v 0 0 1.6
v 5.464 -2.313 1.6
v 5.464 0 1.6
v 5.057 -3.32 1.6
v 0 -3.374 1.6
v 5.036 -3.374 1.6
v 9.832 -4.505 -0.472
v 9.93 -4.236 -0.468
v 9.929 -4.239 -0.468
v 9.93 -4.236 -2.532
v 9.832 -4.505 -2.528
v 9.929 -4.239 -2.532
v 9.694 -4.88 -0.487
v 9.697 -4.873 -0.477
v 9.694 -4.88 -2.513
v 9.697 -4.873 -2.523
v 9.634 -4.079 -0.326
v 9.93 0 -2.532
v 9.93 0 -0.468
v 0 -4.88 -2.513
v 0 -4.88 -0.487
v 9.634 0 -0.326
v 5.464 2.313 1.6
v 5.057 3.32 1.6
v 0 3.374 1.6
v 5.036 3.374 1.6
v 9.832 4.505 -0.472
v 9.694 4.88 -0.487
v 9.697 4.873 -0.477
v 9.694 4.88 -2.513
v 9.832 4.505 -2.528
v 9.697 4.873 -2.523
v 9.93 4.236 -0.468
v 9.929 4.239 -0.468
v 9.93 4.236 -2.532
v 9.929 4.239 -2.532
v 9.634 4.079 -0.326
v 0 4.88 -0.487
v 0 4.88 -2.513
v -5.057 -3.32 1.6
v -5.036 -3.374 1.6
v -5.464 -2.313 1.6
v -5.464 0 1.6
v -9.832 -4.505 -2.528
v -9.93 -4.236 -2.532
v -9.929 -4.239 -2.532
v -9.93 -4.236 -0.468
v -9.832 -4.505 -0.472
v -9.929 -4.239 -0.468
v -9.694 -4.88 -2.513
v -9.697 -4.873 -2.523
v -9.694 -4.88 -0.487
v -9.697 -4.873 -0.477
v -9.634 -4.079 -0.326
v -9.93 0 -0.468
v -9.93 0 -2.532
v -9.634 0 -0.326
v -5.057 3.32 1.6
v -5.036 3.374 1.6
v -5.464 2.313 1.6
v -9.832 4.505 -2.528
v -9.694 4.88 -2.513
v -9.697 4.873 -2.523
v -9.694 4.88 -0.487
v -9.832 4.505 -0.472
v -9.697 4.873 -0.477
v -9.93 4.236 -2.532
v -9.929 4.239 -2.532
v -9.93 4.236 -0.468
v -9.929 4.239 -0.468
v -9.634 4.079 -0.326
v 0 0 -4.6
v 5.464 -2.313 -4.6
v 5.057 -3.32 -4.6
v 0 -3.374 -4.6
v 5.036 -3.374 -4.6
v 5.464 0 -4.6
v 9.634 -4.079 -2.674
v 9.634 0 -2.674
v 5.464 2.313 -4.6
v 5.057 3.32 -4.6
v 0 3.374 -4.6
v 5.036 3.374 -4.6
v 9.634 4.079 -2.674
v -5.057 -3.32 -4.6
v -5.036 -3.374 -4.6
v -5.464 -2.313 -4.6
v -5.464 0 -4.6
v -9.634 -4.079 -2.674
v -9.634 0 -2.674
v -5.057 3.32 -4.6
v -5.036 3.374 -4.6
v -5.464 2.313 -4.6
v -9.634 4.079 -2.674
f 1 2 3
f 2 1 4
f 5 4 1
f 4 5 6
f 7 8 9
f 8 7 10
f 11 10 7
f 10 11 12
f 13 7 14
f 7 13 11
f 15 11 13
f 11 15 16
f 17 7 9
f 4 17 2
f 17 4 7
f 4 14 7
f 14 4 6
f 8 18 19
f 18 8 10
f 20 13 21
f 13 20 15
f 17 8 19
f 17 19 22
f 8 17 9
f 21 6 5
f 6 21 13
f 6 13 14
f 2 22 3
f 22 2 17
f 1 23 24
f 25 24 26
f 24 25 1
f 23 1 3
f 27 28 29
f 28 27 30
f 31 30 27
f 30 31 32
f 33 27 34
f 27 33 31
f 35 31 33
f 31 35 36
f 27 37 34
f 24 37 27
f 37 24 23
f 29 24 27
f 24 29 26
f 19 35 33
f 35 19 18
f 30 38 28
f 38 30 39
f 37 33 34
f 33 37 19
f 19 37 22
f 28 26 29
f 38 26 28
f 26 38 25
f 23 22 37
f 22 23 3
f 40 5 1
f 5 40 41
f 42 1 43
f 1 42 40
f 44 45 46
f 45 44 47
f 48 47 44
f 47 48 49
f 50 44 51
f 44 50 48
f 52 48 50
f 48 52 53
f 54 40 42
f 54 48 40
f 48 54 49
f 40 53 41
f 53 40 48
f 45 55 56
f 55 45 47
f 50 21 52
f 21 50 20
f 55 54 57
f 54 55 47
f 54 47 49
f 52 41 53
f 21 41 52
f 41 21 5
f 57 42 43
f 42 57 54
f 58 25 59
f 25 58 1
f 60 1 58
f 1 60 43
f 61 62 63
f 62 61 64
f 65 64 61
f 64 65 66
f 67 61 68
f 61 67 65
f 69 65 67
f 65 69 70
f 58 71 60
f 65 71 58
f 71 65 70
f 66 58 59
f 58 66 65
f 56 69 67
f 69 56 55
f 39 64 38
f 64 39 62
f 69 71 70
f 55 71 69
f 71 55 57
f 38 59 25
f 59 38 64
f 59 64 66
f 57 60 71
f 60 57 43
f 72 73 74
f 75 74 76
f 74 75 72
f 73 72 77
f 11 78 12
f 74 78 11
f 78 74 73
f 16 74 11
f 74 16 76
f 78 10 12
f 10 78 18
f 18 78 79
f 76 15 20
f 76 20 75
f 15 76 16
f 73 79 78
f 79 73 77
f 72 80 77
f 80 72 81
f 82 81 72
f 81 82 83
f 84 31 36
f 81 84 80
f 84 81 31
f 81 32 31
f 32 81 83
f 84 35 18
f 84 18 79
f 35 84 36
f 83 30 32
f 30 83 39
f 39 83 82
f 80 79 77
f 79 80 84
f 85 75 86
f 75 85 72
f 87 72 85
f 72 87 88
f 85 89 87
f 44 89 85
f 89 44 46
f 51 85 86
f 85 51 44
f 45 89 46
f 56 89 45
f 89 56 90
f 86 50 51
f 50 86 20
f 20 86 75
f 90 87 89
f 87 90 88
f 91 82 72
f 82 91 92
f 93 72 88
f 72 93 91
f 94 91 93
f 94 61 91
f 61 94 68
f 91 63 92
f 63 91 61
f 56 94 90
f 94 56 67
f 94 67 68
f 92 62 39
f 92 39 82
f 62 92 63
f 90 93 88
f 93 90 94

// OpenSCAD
/*
CubePoints = [
  [  1,  0,  0 ],
  [ 0,  1,  0 ],
  [ 0,  8,  0 ],
  [  1,  9,  0 ],
  [  20,  9,  0 ],
  [  21,  8,  0 ],
  [  21,  1,  0 ],
  [  20,  0,  0 ],
  [  1,  0,  0 ],
 ];
 
for(point = CubePoints) {
  #translate(point)cylinder(d = 0.1, h = 1, $fn = 36);
}

CubeFaces = [
  [0,1,2,3],  // bottom
  [4,5,1,0],  // front
  [7,6,5,4],  // top
  [5,6,2,1],  // right
  [6,7,3,2],  // back
  [7,4,0,3],

  [7,4,0,3],
]; // left
  
polyhedron( CubePoints, CubeFaces );
*/
/*
difference() {
    cube([20, 10, 2], true);
    translate([10, 5, 0]) rotate([0, 0, 45]) cube([3, 3, 3], true);
    translate([10, -5, 0]) rotate([0, 0, -45]) cube([3, 3, 3], true);
    translate([-10, 5, 0]) rotate([0, 0, 45]) cube([3, 3, 3], true);
    translate([-10, -5, 0]) rotate([0, 0, -45]) cube([3, 3, 3], true);
}

translate([7.567, 2.567, 0.82]) rotate([0, -45, 45]) cube([3, 3, 2.5], true);
translate([7.567, -2.567, 0.82]) rotate([0, -45, -45]) cube([3, 3, 2.5], true);
translate([-7.567, 2.567, 0.82]) rotate([0, 45, -45]) cube([3, 3, 2.5], true);
translate([-7.567, -2.567, 0.82]) rotate([0, 45, 45]) cube([3, 3, 2.5], true);

translate([0, 0, 1.75]) scale([0.8, 0.7, 1]) difference() {
    cube([20, 10, 2], true);
    translate([10, 5, 0]) rotate([0, 0, 45]) cube([3, 3, 3], true);
    translate([10, -5, 0]) rotate([0, 0, -45]) cube([3, 3, 3], true);
    translate([-10, 5, 0]) rotate([0, 0, 45]) cube([3, 3, 3], true);
    translate([-10, -5, 0]) rotate([0, 0, -45]) cube([3, 3, 3], true);
}
*/
/*
top();
translate([0, 0, -3]) mirror([0, 0, 1]) top();

module top() {
    parts();
    mirror([1, 0, 0]) parts();
}

module parts() {
    part();
    translate([0, 0, 0]) mirror([0, 1, 0]) part();
}

//!part();

module part() {
    s = 1.25;
    r = 28;
    a = 62;
    
    scale([1, 1, 0.8]) difference() {
        cube([20, 10, 4], true);
        translate([10, -5, 0]) rotate([0, 0, -r]) cube([s, s*2, 5], true);
        translate([9, -4, 1.5]) rotate([0, -a, -r]) cube([3, s, 10], true);
        
        translate([0, 5, 0]) cube([22, 10, 6], true);
        translate([-6, 0, 0]) cube([12, 20, 6], true);
        translate([15.93, 0, 0]) cube([12, 20, 6], true);
        translate([0, -10.88, 0]) cube([20, 12, 6], true);
        
        translate([9.1, -1, 1.08]) rotate([0, -(90 + a) + 3, 0]) cylinder(d = 8.4, $fn = 3, true);
        translate([9.1, -1, 2]) rotate([0, -(90 + a) + 3, 0]) cylinder(d = 8.4, $fn = 3, true);
        translate([9.1, -1, 3]) rotate([0, -(90 + a) + 3, 0]) cylinder(d = 8.4, $fn = 3, true);
        translate([7.1, -1, 2.29]) rotate([0, -(90 + a) + 2.5, 0]) cylinder(d = 8.4, $fn = 3, true);
        
        translate([5, -5.51, 2.45]) rotate([-41.5, 0, 0]) cube([12, 5, 6], true);
    }
}
*/

top();
translate([0, 0, -3]) mirror([0, 0, 1]) top();

module top() {
    parts();
    mirror([1, 0, 0]) parts();
}

module parts() {
    part();
    translate([0, 0, 0]) mirror([0, 1, 0]) part();
}

//!part();

module part() {
    s = 1.25;
    r = 28;
    a = 62;
    
    scale([1, 1, 0.8]) difference() {
        cube([20, 10, 4], true);
        translate([10.1, -5.59, 0]) rotate([0, 0, -20.1]) cube([s, s*2, 5], true);
        translate([9, -4.4, 1.54]) rotate([0, -a, -22]) cube([3, s, 10], true);
        //translate([10, -5, 0]) rotate([0, 0, -r]) cube([s, s*2, 5], true);
        //translate([9, -4, 1.5]) rotate([0, -a, -r]) cube([3, s, 10], true);
        
        translate([0, 5, 0]) cube([22, 10, 6], true);
        translate([-6, 0, 0]) cube([12, 20, 6], true);
        translate([15.93, 0, 0]) cube([12, 20, 6], true);
        translate([0, -10.88, 0]) cube([20, 12, 6], true);
        
        translate([9.1, -1, 1.08]) rotate([0, -(90 + a) + 3, 0]) cylinder(d = 8.4, $fn = 3, true);
        translate([9.1, -1, 2]) rotate([0, -(90 + a) + 3, 0]) cylinder(d = 8.4, $fn = 3, true);
        translate([9.1, -1, 3]) rotate([0, -(90 + a) + 3, 0]) cylinder(d = 8.4, $fn = 3, true);
        translate([7.1, -1, 2.29]) rotate([0, -(90 + a) + 2.5, 0]) cylinder(d = 8.4, $fn = 3, true);
        
        translate([5, -5.51, 3.3]) rotate([-30, 0, 0]) cube([12, 5, 8], true);
        translate([10, -2, 4]) rotate([0, 30, 0]) cube([12, 10, 8], true);
    }
}
